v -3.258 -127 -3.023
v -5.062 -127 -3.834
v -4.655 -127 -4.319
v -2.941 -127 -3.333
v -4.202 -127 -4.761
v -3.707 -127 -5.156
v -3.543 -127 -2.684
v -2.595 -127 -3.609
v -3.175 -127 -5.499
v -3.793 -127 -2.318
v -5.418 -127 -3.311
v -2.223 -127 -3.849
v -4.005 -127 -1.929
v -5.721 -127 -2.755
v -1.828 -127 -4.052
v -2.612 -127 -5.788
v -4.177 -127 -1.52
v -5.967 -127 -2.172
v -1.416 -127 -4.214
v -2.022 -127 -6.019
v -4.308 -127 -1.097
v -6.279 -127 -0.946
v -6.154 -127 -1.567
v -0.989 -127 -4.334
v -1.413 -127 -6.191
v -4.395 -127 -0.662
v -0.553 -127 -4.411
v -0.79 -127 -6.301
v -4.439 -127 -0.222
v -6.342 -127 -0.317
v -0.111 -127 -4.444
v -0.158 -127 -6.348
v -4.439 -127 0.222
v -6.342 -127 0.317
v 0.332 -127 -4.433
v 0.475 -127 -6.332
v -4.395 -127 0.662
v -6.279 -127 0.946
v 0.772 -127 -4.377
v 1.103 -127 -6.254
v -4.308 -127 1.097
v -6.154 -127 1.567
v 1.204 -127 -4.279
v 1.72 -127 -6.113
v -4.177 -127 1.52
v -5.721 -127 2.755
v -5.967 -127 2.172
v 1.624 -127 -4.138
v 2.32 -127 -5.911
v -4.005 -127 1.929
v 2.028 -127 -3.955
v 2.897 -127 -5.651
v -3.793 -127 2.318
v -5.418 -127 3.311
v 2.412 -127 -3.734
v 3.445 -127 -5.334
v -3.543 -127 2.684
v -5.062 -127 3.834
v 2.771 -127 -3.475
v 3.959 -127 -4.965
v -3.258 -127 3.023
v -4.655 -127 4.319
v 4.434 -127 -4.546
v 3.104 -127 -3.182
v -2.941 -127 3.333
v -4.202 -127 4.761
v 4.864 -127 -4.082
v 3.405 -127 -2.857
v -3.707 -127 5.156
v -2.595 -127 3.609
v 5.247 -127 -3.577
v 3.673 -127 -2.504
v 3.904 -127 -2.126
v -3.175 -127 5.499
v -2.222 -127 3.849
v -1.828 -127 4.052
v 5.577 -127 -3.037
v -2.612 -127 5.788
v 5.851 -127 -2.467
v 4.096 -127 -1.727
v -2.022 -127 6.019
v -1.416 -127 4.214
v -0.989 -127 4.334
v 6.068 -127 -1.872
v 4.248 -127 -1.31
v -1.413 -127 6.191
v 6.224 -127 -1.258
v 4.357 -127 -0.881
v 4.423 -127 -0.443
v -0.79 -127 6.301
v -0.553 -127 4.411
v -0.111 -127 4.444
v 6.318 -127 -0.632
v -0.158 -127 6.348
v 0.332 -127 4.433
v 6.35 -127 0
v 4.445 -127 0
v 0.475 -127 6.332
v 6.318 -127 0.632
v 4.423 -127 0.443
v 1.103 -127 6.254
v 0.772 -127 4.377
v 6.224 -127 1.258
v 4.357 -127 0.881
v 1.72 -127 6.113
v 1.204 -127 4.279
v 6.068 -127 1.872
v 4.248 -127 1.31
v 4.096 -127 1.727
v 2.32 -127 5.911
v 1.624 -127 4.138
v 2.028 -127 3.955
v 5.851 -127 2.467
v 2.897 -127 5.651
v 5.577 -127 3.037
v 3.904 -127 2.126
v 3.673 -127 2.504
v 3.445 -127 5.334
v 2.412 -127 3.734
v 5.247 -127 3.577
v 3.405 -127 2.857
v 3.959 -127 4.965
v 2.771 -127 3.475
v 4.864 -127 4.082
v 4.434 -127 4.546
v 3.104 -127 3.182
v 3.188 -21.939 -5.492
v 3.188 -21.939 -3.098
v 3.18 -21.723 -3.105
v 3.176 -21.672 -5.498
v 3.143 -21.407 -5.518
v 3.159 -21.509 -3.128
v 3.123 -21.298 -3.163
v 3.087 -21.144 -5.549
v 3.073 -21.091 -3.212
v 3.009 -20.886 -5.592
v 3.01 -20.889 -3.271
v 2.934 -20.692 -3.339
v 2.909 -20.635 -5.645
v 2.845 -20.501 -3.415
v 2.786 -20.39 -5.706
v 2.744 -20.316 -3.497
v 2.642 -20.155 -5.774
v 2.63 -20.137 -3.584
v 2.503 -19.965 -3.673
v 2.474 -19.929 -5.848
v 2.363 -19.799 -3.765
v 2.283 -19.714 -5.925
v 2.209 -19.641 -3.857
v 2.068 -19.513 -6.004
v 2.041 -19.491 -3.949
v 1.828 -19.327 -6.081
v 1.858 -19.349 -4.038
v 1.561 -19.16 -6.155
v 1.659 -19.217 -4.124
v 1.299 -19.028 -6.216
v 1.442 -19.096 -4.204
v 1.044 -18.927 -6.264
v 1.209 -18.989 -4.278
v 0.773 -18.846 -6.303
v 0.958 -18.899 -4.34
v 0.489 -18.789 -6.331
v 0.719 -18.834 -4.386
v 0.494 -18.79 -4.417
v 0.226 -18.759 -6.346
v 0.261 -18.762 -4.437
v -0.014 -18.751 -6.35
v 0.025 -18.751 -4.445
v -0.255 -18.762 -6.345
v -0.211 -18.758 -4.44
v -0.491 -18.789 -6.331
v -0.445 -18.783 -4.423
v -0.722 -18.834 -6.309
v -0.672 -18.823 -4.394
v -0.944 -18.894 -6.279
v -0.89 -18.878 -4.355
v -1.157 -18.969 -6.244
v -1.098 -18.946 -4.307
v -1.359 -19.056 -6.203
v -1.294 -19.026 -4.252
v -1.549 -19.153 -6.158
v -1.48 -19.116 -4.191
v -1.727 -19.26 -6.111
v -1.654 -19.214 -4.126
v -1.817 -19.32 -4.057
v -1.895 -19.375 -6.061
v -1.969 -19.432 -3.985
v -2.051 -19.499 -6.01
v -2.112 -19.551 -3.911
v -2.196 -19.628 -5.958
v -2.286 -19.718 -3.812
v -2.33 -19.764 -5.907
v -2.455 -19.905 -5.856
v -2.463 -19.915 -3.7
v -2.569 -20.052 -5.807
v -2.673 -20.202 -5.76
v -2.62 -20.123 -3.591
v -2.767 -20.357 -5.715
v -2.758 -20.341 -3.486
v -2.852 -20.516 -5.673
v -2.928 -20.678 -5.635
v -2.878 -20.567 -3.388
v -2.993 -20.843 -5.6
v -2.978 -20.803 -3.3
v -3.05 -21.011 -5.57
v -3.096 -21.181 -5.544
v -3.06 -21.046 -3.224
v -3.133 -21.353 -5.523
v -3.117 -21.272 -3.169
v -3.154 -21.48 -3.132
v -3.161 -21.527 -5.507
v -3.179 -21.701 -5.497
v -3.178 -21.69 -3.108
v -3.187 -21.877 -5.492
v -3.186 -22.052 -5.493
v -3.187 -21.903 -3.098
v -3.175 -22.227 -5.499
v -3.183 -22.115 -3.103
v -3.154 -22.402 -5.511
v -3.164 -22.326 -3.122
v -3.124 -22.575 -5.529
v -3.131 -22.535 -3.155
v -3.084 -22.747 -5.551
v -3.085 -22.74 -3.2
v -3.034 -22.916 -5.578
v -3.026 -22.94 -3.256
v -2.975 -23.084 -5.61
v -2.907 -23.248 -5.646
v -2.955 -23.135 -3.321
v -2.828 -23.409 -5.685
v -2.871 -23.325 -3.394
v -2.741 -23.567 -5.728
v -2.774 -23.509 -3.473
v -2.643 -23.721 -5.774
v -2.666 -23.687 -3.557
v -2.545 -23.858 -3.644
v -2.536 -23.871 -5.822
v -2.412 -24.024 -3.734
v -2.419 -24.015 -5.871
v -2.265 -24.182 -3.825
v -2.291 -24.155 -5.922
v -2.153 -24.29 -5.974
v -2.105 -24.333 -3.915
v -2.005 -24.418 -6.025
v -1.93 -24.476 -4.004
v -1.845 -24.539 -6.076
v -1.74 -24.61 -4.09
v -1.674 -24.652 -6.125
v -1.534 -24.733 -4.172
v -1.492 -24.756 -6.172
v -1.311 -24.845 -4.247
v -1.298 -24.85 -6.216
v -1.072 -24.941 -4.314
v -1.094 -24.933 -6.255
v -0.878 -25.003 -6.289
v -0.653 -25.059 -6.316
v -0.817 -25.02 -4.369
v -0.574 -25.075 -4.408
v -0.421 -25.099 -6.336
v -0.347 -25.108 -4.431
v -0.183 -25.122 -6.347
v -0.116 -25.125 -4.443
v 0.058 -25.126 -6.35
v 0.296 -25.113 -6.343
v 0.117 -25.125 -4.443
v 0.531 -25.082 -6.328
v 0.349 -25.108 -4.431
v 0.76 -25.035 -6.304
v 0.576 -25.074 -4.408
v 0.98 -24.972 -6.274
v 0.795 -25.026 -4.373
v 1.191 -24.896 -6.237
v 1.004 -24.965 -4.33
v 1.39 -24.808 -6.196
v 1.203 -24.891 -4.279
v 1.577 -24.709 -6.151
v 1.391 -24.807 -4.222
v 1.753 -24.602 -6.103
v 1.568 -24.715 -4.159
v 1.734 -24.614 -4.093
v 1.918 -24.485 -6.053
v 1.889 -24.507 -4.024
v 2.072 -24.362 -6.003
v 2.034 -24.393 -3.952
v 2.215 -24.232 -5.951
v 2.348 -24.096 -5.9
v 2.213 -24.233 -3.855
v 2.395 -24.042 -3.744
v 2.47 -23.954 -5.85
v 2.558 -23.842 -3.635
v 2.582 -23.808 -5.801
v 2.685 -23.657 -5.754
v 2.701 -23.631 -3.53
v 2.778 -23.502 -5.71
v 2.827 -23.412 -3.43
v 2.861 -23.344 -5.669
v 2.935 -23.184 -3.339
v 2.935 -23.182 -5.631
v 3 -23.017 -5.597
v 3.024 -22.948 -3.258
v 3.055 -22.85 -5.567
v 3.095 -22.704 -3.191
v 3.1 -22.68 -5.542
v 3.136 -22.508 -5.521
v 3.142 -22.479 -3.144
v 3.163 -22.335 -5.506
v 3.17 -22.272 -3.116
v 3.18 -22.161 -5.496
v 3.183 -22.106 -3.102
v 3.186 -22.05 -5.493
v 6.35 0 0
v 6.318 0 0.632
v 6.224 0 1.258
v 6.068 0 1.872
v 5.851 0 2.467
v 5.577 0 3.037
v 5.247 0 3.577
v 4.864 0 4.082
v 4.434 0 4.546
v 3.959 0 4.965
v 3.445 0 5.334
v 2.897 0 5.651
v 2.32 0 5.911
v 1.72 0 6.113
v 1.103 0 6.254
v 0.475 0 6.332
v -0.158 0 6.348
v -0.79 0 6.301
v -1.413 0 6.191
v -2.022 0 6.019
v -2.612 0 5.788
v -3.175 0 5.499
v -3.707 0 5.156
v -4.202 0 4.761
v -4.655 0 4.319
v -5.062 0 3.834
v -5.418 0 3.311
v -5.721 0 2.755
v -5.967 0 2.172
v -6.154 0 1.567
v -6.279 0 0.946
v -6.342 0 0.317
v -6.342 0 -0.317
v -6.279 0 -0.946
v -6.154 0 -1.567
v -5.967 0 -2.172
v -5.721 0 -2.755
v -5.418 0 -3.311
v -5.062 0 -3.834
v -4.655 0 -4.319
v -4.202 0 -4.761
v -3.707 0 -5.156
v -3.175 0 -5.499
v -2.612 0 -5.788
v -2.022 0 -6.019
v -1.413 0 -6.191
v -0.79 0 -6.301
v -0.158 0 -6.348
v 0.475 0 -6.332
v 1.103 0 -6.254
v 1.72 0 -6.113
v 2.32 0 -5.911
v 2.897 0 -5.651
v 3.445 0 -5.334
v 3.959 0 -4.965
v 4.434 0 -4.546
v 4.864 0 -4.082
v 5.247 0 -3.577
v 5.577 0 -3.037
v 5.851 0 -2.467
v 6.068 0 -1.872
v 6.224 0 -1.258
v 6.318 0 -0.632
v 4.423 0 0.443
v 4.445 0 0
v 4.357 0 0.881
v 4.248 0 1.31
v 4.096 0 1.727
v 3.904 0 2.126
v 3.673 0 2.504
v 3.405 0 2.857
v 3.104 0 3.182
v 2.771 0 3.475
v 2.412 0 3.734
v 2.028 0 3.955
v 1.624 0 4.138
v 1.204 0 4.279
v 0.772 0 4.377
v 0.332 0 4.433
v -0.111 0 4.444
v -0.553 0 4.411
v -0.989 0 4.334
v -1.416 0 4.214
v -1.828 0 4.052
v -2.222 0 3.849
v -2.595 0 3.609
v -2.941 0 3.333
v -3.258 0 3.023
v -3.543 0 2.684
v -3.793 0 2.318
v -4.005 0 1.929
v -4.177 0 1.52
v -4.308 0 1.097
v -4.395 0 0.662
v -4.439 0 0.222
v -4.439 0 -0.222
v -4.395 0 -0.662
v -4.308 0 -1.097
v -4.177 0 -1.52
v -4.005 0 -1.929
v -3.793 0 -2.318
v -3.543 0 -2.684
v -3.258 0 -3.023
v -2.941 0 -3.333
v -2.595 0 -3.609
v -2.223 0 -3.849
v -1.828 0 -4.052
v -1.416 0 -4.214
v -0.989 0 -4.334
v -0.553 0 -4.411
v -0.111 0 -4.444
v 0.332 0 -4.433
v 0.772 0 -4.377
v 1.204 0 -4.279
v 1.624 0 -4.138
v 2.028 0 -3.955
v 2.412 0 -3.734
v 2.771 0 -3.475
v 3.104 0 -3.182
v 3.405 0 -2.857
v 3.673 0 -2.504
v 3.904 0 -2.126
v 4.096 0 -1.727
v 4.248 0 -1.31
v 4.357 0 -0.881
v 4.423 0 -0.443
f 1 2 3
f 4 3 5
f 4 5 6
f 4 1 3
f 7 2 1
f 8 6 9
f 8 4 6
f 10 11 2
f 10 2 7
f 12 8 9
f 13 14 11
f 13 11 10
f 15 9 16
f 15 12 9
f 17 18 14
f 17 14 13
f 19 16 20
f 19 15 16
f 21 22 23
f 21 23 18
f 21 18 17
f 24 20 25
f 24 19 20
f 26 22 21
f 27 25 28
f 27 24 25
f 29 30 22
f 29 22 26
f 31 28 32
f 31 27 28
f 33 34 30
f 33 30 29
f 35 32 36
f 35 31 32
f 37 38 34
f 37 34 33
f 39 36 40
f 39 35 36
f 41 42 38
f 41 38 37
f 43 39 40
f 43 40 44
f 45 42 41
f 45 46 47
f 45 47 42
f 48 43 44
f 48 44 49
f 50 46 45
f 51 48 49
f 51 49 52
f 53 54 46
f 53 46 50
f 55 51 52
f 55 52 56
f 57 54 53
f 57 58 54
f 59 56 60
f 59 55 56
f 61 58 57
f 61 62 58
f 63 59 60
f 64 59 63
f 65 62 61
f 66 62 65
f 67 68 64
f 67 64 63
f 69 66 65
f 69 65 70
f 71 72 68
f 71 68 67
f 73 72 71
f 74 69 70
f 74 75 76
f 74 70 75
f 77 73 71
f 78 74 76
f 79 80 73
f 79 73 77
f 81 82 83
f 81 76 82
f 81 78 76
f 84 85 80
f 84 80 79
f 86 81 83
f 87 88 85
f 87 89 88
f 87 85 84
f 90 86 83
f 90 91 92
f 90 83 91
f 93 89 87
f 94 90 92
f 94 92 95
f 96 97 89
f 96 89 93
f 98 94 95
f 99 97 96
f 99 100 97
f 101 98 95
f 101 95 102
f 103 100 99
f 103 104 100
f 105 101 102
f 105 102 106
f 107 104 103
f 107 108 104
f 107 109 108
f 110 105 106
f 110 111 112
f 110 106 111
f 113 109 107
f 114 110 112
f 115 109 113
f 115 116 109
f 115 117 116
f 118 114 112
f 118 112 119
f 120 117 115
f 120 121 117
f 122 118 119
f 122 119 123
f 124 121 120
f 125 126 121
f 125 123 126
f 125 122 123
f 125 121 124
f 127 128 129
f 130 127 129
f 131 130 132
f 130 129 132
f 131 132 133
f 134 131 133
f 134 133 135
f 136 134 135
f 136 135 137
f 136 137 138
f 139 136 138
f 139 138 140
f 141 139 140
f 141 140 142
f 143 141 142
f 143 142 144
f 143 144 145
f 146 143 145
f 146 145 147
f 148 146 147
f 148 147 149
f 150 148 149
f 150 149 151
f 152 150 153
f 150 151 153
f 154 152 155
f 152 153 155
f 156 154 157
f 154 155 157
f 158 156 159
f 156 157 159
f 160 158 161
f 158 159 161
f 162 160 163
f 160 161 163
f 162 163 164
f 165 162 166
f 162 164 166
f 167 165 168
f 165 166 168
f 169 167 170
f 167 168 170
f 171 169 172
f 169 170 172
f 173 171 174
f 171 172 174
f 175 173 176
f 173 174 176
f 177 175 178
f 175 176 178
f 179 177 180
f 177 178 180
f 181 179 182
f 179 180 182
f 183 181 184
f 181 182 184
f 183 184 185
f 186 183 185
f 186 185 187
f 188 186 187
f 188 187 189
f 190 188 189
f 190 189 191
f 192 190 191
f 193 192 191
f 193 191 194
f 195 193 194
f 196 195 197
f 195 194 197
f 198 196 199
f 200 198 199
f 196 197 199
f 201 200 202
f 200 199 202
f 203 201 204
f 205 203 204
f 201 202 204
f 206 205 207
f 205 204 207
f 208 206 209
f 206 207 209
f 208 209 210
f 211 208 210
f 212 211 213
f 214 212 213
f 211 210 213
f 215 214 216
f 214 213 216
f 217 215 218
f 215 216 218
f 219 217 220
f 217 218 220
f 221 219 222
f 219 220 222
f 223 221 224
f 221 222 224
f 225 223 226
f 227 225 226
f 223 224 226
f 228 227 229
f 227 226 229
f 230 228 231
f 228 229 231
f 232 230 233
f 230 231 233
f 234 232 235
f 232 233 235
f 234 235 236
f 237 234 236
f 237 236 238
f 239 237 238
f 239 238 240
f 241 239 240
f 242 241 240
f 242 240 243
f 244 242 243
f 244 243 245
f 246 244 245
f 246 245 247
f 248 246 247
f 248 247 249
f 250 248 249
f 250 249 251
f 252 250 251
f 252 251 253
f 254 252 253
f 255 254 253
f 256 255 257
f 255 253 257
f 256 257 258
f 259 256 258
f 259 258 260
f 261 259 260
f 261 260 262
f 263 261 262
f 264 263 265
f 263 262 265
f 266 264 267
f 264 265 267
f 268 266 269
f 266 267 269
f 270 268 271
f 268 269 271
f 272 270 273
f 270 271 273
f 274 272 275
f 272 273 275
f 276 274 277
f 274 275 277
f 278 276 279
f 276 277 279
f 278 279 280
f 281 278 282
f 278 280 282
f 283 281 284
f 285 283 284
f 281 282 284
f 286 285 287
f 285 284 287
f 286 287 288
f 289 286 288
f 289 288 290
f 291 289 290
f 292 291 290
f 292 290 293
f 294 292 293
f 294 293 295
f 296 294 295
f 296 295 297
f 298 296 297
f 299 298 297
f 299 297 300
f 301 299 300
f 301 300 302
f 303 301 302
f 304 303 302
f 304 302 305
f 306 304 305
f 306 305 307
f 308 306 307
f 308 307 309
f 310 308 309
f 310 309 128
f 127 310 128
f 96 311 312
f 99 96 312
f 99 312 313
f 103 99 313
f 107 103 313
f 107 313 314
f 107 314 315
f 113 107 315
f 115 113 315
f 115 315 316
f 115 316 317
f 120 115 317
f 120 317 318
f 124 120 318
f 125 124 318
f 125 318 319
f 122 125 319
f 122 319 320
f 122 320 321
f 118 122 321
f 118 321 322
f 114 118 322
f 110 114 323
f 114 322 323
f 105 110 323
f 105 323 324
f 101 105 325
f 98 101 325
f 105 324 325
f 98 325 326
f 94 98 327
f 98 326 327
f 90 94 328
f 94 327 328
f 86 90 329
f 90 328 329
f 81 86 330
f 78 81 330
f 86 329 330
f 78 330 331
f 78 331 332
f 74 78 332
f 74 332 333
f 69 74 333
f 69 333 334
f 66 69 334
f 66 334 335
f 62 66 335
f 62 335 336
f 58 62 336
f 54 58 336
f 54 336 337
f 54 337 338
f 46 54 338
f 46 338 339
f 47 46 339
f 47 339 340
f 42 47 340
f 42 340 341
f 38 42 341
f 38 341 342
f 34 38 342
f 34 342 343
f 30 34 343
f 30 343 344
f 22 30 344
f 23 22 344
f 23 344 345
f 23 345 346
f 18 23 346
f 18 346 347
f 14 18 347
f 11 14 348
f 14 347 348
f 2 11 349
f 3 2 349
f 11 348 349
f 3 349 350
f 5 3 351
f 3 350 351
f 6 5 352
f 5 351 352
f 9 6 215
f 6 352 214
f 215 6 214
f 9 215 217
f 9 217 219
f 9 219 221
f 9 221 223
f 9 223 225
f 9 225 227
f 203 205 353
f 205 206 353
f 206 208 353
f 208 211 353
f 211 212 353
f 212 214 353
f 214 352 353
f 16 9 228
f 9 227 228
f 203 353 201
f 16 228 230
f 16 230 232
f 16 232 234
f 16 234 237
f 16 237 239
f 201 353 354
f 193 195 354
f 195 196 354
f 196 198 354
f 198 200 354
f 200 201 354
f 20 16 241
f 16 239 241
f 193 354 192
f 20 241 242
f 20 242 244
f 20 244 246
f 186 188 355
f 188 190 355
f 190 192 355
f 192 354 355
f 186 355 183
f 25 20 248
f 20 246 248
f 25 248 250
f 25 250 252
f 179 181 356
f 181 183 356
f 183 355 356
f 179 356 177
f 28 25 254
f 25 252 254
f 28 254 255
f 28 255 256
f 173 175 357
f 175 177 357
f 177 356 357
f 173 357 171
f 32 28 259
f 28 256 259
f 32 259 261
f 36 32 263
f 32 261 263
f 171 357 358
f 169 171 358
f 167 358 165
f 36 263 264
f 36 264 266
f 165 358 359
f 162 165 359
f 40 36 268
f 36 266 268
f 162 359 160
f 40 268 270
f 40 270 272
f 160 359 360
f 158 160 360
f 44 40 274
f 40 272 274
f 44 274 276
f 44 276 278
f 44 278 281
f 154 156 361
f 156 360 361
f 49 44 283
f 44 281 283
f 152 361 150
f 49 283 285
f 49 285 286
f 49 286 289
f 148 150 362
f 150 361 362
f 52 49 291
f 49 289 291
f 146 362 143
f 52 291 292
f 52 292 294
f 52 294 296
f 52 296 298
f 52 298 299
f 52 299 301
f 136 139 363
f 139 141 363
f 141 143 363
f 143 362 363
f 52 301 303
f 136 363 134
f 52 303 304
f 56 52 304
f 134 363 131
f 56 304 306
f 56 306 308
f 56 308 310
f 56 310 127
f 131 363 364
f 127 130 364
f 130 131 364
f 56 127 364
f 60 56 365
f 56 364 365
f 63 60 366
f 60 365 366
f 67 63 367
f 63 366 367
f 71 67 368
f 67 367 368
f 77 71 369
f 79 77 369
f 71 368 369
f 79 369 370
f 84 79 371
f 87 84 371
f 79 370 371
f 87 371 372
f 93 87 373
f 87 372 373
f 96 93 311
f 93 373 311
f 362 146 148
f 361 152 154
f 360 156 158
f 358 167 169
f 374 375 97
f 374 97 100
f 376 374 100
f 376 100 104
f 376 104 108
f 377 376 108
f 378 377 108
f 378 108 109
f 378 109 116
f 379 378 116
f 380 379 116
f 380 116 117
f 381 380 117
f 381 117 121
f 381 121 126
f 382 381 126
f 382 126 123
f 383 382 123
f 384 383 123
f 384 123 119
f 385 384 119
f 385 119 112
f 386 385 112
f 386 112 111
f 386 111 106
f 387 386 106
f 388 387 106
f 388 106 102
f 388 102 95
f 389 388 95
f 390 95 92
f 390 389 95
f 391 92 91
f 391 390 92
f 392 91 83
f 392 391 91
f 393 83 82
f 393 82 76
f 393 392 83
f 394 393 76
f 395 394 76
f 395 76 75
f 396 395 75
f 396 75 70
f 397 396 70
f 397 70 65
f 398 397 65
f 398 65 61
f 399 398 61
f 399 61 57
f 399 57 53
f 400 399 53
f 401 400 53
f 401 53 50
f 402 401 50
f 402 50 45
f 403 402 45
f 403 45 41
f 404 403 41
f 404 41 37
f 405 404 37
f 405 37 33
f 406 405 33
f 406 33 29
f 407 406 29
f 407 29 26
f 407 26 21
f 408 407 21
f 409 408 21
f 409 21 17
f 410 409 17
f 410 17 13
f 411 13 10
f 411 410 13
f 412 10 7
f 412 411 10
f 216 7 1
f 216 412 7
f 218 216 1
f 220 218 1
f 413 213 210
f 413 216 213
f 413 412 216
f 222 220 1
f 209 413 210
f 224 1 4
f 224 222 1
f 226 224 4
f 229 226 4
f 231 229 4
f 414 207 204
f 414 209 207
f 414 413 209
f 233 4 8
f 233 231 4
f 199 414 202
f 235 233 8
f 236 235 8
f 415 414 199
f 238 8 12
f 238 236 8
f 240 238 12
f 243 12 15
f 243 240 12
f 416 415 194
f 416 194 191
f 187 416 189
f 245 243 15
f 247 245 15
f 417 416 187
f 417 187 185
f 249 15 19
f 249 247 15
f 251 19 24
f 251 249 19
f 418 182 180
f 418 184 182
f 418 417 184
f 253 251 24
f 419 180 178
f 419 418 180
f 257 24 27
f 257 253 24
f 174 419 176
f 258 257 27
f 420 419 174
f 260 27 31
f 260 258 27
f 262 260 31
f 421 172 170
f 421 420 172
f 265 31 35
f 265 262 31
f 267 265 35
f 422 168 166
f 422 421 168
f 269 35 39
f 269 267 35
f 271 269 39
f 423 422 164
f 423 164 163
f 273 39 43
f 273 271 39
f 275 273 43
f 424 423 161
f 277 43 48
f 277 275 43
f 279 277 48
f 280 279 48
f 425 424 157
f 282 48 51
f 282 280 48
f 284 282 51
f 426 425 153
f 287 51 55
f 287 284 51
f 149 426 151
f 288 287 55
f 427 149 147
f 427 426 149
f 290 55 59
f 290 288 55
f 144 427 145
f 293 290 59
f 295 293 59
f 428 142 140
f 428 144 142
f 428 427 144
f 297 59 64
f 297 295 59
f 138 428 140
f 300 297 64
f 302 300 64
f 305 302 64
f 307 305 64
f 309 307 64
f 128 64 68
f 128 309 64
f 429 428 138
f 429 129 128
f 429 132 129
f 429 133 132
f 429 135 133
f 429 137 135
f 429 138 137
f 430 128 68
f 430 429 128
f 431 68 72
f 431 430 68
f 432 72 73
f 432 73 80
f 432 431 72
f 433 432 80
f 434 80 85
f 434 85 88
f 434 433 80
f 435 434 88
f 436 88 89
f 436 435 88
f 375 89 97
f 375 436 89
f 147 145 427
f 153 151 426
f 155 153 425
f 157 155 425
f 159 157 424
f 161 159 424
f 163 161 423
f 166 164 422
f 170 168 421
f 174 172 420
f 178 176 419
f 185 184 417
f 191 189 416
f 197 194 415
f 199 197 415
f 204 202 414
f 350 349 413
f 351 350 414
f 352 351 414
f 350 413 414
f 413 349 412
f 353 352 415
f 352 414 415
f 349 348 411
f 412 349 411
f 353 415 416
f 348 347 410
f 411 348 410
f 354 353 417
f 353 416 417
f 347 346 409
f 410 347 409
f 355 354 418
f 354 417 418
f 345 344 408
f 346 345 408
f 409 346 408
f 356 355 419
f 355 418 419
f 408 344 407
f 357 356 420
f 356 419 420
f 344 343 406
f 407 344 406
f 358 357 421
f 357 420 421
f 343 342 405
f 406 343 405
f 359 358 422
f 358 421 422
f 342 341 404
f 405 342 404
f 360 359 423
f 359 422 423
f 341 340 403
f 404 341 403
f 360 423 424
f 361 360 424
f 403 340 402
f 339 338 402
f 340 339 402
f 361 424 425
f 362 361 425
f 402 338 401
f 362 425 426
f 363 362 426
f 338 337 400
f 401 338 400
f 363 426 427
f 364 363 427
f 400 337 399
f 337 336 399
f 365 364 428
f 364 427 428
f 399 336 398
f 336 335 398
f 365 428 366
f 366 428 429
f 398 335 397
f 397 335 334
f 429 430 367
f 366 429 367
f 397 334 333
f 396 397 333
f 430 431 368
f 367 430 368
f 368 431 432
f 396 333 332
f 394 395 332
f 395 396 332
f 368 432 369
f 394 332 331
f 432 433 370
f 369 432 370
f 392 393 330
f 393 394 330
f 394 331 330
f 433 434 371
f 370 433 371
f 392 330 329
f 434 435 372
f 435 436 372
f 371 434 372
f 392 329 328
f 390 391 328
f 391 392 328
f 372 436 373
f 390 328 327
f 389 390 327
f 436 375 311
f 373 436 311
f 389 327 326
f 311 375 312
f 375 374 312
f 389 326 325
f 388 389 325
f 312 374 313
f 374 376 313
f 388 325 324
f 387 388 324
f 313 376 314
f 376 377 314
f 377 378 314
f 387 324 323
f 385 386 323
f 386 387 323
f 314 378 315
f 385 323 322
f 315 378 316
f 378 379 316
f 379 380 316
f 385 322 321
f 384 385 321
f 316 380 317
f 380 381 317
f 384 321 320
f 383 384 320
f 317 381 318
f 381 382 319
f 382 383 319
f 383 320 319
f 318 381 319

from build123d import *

# Parameters (mm, degrees)
F0_R     = 6.35
F1_DEPTH = 127
F2_R     = 4.445
F3_DEPTH = 127
F4_R     = 3.1877
F5_DEPTH = 6.351


with BuildPart() as f1:
    # F0 (on Front) → F1 (new body)
    with BuildSketch(Plane.XZ):
        Circle(F0_R)
    extrude(amount=F1_DEPTH)

    # F2 (on Front) → F3 (cut)
    with BuildSketch(Plane.XZ):
        Circle(F2_R)
    extrude(amount=F3_DEPTH, mode=Mode.SUBTRACT)

    # F4 (on Top) → F5 (cut, through all)
    with BuildSketch(Plane.XY):
        with Locations((0, -21.939068)):
            Circle(F4_R)
    extrude(amount=-F5_DEPTH, mode=Mode.SUBTRACT)


solid = f1.part
